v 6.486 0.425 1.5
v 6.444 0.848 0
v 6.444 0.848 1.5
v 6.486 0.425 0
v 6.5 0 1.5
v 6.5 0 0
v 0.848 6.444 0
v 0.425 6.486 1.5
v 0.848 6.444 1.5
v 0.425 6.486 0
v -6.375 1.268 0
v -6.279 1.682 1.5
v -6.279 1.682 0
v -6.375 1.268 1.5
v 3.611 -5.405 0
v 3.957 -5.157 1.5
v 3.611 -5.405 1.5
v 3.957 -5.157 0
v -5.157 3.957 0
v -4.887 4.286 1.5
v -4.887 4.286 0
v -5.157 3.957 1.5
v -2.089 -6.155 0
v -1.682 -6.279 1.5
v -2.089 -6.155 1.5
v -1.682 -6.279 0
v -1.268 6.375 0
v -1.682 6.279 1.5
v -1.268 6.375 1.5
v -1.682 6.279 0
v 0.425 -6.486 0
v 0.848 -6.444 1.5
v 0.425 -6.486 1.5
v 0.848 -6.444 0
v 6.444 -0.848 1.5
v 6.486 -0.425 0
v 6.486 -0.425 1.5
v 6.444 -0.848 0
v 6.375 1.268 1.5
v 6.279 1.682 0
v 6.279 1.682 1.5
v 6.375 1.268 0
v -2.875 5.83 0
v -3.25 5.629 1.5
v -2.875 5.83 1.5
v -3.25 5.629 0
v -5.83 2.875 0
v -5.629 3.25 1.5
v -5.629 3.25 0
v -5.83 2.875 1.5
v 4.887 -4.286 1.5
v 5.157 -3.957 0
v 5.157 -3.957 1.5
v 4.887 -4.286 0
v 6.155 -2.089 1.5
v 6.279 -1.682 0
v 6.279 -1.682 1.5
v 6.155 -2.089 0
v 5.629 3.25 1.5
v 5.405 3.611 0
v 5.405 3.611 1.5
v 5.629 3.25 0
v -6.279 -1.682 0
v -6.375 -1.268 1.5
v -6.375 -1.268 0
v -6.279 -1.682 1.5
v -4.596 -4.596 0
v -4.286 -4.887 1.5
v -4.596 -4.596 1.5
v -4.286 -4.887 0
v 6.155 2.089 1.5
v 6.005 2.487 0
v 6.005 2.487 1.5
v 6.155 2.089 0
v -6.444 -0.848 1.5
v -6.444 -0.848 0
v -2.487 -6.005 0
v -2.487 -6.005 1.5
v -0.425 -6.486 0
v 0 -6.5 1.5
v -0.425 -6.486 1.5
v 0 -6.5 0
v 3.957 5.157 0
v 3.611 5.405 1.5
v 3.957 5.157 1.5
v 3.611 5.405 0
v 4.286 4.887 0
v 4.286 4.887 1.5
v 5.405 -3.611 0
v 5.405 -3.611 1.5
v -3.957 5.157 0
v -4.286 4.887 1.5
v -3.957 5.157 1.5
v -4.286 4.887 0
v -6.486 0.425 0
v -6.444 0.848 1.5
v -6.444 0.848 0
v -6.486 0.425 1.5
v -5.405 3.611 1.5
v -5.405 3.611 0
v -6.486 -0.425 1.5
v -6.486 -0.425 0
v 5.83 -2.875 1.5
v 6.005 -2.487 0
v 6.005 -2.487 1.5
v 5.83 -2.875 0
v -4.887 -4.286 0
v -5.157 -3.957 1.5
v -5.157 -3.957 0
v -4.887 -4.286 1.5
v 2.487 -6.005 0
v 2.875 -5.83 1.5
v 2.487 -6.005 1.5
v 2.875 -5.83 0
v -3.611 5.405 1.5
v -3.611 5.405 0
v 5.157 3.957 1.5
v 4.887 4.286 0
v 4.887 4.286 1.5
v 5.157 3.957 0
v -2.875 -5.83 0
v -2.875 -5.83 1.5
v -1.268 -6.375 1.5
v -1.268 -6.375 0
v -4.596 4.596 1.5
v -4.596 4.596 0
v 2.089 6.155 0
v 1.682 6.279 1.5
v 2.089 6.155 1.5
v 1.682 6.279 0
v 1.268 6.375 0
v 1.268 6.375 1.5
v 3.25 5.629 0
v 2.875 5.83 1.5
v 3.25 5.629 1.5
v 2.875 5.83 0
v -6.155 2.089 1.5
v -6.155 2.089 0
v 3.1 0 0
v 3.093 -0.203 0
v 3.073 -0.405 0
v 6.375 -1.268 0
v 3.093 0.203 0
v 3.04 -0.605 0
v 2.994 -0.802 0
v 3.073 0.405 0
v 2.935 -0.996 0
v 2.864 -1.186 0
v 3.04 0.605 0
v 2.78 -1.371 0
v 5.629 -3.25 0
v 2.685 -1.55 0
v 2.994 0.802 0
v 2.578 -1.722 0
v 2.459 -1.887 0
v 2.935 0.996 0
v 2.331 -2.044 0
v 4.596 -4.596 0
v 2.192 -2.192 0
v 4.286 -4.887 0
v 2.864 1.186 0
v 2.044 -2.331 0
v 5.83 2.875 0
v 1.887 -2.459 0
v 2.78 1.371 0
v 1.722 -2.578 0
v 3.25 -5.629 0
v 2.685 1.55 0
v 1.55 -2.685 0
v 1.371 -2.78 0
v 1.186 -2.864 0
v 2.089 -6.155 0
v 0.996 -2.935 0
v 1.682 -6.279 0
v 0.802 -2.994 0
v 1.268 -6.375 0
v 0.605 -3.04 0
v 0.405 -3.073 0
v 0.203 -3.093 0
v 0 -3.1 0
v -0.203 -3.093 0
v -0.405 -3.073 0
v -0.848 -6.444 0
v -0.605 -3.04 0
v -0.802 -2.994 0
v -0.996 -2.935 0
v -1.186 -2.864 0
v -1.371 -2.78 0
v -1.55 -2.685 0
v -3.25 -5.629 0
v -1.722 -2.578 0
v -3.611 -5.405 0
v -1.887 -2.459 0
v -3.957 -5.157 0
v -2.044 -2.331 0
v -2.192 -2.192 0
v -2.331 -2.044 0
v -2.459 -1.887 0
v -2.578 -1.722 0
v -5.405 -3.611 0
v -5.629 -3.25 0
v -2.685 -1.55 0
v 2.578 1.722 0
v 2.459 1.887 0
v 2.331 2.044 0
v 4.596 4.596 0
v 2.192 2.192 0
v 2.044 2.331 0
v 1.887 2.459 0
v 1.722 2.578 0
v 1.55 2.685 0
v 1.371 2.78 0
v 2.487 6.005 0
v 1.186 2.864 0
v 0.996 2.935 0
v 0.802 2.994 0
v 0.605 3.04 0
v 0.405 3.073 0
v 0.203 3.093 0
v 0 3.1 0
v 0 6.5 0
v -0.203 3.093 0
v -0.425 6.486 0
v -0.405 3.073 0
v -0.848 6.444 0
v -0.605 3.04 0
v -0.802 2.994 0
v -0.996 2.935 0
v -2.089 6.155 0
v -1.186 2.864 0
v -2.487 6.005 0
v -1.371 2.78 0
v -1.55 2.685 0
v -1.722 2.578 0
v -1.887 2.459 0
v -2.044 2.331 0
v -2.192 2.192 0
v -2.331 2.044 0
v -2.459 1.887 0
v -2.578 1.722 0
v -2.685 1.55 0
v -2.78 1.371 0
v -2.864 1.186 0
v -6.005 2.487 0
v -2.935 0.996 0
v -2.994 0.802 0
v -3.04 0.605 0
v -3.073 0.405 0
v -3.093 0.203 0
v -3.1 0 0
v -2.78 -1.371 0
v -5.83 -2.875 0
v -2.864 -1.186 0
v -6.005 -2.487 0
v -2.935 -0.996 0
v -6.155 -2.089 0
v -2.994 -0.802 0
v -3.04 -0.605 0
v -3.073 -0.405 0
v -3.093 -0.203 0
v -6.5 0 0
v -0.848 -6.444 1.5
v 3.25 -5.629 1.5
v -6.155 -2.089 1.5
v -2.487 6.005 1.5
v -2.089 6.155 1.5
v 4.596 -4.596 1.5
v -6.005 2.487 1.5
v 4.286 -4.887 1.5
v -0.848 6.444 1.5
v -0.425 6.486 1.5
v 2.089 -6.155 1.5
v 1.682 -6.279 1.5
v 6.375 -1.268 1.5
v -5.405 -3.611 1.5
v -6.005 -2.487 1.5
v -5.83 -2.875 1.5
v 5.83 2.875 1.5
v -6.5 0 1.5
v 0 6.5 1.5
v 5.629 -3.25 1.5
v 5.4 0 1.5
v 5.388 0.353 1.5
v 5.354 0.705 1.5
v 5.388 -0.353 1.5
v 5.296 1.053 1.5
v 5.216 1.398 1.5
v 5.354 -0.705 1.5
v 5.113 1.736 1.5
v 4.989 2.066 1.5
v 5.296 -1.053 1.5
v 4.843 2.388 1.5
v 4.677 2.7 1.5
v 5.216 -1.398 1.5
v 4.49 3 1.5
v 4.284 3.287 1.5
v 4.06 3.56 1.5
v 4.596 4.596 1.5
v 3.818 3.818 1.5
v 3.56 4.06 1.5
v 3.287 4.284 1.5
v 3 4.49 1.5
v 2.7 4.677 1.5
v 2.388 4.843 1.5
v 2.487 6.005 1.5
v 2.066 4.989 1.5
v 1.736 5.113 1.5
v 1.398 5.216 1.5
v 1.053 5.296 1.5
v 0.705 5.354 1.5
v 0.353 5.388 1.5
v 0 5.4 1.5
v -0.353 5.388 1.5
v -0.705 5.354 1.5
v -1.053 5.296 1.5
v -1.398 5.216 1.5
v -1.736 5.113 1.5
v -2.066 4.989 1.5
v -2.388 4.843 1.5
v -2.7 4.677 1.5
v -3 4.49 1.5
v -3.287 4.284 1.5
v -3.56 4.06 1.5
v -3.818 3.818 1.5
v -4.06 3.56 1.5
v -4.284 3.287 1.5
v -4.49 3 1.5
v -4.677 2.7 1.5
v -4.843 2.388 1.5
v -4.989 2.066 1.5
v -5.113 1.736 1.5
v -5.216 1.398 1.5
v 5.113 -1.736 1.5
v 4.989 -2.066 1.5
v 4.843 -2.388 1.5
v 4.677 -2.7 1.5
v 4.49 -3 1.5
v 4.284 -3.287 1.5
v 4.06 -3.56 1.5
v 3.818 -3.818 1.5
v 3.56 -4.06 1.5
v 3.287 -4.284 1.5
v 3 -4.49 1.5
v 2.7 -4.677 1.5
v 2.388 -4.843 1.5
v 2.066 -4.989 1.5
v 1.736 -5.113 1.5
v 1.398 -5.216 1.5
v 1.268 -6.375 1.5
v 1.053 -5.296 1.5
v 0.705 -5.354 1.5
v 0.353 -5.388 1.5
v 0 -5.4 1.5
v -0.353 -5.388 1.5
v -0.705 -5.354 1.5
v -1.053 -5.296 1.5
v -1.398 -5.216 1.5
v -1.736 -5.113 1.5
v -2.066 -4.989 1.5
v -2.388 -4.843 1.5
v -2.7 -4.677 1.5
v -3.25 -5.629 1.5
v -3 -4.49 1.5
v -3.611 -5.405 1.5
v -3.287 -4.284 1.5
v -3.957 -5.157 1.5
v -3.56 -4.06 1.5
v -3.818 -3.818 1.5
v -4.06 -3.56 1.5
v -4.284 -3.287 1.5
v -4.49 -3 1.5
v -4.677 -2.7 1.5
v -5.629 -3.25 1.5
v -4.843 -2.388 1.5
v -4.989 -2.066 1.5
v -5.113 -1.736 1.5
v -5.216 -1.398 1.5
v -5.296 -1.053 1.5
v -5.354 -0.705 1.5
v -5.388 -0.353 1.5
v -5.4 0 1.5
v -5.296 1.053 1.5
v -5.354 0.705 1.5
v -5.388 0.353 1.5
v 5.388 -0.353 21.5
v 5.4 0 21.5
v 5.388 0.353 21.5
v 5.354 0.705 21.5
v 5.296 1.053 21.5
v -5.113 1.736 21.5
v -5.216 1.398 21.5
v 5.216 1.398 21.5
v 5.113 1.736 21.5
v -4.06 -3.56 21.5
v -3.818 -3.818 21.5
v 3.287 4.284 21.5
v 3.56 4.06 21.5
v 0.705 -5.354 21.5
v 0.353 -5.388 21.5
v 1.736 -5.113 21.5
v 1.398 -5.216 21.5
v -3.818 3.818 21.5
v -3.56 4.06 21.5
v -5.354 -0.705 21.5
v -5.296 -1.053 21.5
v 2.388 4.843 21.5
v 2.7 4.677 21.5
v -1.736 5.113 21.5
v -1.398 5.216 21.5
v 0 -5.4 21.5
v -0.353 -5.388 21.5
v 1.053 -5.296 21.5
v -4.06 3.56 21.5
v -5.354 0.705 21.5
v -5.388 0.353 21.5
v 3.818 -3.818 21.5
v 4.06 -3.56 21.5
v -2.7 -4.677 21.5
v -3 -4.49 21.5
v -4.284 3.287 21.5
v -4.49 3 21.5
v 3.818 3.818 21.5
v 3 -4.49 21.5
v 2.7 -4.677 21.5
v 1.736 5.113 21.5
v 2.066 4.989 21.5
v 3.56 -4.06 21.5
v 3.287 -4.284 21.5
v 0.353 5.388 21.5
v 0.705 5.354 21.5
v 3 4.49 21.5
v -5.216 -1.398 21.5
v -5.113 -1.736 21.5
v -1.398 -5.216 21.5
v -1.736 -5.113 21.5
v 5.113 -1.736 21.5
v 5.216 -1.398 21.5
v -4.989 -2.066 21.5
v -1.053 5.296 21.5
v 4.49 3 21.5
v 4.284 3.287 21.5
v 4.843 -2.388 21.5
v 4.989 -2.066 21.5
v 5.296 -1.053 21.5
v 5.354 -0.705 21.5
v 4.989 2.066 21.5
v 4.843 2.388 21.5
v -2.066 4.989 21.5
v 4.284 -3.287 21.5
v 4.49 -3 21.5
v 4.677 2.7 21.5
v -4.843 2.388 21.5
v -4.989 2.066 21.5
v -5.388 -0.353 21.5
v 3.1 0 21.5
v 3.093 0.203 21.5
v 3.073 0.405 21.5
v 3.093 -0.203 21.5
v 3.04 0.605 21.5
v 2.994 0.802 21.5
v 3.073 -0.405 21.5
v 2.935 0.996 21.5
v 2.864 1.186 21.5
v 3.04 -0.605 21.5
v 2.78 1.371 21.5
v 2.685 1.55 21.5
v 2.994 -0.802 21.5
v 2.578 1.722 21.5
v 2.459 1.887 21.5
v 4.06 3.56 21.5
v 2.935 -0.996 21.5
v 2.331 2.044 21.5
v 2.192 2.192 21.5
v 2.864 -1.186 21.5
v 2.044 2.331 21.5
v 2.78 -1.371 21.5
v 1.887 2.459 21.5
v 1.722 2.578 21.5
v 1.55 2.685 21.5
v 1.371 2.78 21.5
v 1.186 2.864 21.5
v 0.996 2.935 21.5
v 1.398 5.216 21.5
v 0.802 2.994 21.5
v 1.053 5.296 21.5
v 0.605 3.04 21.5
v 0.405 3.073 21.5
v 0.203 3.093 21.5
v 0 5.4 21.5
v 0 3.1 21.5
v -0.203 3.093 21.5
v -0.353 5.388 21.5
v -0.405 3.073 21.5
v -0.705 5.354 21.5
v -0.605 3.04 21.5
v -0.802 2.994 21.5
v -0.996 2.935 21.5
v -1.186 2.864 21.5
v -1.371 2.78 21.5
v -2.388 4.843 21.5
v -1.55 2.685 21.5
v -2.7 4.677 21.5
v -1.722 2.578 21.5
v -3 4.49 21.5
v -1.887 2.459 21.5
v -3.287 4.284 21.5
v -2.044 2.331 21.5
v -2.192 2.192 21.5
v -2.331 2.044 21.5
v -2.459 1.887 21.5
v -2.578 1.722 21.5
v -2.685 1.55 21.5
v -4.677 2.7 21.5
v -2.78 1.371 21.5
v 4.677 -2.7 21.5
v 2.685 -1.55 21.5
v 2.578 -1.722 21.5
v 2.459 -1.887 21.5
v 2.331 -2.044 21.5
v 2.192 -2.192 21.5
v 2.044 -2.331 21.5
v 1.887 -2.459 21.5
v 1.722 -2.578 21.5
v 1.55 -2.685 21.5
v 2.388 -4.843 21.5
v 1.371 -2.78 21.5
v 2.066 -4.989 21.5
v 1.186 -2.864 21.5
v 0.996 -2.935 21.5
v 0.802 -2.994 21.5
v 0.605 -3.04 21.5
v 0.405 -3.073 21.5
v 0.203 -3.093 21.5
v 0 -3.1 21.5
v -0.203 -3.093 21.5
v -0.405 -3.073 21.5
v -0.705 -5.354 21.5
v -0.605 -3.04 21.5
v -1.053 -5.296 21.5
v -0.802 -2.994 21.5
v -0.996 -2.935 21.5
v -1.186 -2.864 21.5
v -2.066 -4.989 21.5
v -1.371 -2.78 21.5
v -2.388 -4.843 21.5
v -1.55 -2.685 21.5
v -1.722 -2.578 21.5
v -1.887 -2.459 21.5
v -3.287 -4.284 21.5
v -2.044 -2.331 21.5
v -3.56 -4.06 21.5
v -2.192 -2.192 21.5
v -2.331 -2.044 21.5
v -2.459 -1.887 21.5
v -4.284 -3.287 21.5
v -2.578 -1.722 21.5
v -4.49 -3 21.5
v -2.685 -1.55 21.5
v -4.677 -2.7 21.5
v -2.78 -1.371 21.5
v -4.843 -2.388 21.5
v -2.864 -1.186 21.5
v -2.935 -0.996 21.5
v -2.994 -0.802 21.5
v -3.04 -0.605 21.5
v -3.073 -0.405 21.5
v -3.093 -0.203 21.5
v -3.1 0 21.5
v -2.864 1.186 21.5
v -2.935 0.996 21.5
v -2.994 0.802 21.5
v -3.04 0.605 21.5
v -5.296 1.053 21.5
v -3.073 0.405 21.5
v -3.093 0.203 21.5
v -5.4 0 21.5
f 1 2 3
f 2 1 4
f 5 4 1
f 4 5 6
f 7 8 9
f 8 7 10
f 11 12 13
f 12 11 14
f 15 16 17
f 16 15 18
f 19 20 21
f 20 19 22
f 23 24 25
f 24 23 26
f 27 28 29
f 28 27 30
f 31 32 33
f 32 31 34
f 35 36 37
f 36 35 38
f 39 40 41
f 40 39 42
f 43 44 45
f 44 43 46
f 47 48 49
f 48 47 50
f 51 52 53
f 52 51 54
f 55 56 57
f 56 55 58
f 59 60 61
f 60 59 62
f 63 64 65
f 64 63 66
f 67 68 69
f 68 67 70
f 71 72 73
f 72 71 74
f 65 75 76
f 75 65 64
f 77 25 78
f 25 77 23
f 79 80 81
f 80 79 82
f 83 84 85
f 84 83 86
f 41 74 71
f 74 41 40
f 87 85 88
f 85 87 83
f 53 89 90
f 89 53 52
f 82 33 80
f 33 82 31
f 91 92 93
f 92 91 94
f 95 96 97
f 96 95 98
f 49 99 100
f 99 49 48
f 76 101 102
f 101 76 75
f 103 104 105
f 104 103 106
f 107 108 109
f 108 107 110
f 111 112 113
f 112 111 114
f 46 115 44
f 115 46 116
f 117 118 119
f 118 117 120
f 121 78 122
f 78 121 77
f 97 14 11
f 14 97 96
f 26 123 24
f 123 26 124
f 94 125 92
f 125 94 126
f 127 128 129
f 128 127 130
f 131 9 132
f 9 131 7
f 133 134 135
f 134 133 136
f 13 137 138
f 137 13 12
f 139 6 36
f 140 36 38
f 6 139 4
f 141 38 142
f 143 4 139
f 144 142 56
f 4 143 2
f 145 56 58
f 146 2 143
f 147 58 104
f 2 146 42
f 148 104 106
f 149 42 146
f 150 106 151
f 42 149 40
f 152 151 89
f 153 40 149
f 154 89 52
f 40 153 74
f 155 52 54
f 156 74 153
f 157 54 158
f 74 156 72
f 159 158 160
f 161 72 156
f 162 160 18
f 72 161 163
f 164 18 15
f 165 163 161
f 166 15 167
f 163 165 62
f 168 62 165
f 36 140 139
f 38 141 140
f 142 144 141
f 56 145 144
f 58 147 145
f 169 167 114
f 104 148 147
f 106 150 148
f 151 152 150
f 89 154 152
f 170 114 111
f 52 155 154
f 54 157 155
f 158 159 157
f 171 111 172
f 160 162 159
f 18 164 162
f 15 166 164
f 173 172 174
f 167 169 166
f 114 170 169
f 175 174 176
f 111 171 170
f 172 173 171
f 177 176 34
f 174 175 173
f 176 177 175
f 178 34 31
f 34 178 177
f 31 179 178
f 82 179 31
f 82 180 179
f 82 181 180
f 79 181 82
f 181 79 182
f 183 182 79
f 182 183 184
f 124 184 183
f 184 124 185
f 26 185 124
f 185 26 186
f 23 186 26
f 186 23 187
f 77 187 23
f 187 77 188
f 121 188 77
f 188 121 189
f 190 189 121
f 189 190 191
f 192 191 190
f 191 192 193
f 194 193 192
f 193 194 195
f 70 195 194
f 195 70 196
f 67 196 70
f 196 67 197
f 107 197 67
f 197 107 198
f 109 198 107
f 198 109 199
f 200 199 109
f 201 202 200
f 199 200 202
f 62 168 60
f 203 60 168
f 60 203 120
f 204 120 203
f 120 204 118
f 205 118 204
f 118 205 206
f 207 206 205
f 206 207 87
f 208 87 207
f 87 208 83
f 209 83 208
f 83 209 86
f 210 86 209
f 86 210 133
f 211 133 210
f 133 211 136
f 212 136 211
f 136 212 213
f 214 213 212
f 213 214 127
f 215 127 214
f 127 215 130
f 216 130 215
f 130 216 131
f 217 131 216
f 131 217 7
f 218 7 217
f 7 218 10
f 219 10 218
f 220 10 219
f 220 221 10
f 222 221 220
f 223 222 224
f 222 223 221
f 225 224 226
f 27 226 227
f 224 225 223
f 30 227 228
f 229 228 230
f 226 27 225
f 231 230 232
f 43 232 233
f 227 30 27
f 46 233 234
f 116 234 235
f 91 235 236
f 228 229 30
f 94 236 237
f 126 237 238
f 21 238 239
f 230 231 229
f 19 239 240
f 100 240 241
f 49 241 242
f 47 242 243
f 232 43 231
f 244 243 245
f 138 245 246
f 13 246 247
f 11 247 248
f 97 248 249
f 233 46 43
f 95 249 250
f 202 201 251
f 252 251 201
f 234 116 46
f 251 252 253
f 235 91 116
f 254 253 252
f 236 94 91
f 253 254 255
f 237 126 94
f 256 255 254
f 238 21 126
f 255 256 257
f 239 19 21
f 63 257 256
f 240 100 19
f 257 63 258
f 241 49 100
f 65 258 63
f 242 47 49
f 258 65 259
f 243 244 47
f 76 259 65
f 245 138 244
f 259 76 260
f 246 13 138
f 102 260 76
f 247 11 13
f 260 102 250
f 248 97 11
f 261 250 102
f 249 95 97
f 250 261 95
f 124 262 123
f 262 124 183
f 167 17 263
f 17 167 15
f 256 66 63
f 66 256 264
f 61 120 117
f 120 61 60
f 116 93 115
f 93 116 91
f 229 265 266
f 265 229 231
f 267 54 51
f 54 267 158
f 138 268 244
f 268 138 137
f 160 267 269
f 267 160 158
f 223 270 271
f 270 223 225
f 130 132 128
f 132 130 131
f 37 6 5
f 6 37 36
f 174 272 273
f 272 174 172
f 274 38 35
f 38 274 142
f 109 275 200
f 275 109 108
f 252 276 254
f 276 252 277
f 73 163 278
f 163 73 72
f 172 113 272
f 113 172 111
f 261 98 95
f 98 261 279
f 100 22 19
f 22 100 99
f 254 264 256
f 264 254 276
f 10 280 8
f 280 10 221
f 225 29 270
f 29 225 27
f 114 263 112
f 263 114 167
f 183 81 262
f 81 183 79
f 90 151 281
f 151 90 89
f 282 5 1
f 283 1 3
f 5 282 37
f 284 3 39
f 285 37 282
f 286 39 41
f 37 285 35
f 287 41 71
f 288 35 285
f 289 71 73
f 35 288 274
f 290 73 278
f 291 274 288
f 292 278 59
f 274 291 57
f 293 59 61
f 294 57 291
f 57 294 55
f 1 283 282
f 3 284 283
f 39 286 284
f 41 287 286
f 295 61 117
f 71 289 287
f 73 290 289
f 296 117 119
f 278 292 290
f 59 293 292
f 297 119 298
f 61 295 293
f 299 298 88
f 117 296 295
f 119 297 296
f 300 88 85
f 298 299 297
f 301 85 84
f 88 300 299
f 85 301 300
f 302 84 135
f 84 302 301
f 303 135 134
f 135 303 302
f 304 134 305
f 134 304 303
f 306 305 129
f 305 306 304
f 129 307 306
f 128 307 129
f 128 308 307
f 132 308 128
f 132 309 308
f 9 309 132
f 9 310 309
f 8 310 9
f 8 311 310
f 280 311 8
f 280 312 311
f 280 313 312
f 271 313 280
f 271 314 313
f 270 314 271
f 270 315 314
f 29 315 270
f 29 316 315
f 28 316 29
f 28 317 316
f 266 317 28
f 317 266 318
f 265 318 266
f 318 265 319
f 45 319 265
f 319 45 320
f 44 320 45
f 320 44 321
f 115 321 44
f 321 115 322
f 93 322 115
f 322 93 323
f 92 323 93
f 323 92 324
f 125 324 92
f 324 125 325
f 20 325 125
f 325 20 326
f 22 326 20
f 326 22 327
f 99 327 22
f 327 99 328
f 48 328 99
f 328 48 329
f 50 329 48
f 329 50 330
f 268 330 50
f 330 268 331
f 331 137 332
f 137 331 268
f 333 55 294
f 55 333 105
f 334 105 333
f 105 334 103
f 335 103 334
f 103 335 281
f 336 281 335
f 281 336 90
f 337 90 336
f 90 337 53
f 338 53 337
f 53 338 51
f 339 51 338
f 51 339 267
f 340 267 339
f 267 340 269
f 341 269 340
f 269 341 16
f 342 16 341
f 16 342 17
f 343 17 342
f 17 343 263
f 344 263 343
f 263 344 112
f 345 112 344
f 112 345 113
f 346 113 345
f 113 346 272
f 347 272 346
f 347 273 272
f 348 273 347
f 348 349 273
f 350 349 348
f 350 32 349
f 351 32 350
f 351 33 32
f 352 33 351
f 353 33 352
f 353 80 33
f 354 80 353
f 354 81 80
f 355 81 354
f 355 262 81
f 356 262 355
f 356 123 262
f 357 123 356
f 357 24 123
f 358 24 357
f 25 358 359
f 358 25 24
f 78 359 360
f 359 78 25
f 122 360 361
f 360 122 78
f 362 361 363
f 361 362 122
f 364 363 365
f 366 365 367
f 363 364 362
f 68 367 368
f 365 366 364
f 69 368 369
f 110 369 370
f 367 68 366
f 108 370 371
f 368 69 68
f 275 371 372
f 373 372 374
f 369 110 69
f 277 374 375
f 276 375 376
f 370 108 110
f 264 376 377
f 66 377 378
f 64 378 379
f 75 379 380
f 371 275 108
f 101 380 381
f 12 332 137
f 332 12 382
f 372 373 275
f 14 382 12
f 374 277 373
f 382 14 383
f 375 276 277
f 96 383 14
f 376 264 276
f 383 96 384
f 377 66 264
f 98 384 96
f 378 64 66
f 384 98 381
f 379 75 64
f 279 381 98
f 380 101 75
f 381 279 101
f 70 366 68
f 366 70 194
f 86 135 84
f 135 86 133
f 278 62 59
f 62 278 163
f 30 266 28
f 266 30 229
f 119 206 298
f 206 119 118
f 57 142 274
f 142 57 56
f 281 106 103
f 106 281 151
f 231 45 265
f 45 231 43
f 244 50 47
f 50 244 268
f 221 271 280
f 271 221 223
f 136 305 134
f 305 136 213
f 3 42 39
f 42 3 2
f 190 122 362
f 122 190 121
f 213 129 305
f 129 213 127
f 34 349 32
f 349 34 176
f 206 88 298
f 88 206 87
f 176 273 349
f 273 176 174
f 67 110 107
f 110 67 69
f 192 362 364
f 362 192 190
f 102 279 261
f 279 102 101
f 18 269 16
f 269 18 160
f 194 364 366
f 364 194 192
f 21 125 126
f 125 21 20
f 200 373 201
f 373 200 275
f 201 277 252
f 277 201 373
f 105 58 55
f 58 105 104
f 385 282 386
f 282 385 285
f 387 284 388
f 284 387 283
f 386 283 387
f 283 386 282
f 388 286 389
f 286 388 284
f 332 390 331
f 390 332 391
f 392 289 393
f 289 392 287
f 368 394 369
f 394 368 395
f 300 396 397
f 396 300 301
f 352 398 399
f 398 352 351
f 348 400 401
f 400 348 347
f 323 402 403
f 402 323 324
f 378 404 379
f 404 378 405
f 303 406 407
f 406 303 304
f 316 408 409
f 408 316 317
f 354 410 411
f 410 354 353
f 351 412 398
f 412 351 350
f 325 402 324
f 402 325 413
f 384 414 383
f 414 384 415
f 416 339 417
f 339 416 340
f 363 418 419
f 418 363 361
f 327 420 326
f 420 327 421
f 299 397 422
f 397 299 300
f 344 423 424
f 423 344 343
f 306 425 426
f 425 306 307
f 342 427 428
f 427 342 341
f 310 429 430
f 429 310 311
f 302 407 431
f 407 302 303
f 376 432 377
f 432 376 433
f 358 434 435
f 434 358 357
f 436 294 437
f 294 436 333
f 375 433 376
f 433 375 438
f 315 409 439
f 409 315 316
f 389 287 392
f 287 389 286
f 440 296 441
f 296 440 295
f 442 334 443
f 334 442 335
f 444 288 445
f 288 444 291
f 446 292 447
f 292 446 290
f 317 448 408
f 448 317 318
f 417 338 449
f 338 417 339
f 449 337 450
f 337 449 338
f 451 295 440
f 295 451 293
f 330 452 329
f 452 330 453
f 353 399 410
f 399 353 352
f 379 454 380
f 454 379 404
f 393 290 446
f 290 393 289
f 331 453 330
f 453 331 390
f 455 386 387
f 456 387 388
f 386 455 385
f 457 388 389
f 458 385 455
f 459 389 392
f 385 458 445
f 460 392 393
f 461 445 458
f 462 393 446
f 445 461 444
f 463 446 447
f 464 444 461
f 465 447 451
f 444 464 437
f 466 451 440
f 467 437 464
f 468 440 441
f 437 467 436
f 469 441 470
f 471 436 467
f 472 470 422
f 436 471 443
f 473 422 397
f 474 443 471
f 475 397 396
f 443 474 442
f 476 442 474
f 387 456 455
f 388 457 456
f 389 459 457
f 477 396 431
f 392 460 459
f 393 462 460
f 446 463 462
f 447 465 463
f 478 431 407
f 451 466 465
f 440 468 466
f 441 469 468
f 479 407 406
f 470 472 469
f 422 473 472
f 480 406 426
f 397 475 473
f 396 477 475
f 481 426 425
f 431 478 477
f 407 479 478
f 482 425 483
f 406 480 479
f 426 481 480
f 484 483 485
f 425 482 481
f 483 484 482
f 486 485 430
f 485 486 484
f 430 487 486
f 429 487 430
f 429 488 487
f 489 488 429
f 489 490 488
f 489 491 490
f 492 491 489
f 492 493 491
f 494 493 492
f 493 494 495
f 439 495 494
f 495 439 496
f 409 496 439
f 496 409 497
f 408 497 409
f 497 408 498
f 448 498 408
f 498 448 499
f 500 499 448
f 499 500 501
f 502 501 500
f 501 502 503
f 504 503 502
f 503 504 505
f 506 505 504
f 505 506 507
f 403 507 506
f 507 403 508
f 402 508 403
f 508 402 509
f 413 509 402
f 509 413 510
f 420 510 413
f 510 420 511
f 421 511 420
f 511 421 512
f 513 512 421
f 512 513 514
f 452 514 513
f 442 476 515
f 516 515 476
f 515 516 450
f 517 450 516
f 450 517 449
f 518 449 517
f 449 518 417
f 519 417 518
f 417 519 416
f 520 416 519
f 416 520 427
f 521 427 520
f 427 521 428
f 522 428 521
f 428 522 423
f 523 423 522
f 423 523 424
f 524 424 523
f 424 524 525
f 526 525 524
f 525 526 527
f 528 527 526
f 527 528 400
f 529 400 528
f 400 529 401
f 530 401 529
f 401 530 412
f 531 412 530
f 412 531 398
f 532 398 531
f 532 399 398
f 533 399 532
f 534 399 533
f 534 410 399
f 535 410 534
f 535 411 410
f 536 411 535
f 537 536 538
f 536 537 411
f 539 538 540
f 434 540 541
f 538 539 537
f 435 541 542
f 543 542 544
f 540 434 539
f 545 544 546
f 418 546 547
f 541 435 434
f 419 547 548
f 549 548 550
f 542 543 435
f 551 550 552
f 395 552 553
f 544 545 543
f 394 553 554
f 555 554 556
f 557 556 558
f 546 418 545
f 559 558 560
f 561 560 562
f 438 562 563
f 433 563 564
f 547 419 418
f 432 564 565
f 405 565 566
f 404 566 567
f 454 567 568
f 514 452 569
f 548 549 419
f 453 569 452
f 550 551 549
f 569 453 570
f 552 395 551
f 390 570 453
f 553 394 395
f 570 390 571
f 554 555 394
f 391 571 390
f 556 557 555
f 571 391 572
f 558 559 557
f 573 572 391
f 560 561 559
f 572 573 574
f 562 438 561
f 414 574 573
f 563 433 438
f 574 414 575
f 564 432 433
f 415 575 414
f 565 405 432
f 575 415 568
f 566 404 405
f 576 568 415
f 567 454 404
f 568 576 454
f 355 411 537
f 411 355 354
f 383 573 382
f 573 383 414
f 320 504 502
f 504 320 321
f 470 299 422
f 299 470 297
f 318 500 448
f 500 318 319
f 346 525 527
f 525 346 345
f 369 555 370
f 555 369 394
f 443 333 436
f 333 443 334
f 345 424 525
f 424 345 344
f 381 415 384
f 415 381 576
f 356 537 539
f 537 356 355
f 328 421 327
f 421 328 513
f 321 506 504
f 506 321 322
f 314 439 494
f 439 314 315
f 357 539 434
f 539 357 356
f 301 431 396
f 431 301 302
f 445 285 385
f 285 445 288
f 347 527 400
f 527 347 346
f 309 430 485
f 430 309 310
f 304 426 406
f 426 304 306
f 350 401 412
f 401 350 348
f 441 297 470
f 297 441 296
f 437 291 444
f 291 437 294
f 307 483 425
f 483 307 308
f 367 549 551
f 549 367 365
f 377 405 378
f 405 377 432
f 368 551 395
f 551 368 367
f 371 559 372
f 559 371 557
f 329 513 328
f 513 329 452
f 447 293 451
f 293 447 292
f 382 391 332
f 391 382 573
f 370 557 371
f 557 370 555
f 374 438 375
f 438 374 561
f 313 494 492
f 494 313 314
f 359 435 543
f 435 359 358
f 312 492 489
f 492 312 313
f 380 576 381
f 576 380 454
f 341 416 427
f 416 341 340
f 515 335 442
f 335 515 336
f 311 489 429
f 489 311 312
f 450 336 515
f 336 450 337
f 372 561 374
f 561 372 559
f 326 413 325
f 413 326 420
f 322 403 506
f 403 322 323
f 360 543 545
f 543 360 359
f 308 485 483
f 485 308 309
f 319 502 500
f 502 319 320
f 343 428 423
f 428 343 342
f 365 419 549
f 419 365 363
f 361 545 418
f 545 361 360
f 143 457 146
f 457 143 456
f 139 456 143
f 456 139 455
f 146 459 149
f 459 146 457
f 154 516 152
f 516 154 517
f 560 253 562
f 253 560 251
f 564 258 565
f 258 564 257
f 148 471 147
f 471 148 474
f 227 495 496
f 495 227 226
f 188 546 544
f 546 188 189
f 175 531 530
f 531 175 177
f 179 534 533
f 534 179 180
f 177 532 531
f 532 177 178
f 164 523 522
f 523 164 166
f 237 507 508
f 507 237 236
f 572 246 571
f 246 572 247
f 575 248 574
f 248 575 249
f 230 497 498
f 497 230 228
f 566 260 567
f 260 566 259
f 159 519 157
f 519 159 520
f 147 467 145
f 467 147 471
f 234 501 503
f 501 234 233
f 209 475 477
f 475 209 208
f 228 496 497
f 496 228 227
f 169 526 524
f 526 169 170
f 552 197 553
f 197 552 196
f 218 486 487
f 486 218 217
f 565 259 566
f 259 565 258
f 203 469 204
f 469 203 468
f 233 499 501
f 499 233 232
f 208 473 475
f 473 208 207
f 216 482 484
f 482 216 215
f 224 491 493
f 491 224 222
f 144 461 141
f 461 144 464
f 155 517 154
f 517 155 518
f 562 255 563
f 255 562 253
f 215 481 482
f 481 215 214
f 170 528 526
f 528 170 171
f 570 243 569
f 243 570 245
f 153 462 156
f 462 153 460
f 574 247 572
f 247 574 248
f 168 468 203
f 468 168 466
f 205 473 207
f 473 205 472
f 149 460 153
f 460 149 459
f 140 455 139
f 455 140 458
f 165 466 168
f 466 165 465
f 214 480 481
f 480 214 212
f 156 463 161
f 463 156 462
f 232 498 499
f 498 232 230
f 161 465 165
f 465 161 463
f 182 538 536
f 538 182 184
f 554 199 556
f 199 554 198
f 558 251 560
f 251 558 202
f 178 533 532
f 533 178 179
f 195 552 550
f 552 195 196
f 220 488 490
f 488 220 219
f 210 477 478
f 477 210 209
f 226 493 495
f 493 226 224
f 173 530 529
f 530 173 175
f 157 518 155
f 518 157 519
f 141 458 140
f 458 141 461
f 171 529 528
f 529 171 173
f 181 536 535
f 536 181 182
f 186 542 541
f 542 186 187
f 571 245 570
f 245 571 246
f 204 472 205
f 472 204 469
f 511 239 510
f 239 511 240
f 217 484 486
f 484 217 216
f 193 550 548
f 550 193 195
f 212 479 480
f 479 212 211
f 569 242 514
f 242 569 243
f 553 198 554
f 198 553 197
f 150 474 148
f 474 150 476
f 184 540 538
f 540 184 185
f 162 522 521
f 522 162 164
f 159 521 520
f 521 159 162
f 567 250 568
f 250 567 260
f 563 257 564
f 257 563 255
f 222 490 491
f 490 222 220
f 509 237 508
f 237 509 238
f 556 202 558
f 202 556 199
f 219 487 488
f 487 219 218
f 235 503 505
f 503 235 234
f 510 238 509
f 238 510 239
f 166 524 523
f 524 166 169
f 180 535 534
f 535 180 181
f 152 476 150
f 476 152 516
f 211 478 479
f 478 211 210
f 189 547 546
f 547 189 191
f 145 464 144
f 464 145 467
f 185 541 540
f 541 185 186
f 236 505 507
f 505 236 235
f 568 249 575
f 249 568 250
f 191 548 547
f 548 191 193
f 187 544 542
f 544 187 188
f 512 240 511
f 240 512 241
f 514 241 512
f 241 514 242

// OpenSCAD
// PCR tube adapter sleeve: 0.2 mL tube in a 1.5 mL rack hole
// Print orientation: collar on bed (z = 0), sleeve rises to z = 21.5

// ---- Dimensions (mm) ----
collar_d        = 13;    // collar outer diameter
collar_h        = 1.5;   // collar thickness
sleeve_od       = 10.8;  // sleeve outer diameter
sleeve_top_z    = 21.5;  // top of sleeve body
bore_d          = 6.2;   // through-bore diameter
eps             = 0.5;   // cutter overshoot past faces

$fn = 96;

difference() {
    union() {
        // Collar
        cylinder(d = collar_d, h = collar_h);
        // Sleeve body (slightly overlapping collar for a clean union)
        translate([0, 0, collar_h - 0.01])
            cylinder(d = sleeve_od, h = sleeve_top_z - collar_h + 0.01);
    }
    // Full-height bore, open at both ends
    translate([0, 0, -eps])
        cylinder(d = bore_d, h = sleeve_top_z + 2 * eps);
}
